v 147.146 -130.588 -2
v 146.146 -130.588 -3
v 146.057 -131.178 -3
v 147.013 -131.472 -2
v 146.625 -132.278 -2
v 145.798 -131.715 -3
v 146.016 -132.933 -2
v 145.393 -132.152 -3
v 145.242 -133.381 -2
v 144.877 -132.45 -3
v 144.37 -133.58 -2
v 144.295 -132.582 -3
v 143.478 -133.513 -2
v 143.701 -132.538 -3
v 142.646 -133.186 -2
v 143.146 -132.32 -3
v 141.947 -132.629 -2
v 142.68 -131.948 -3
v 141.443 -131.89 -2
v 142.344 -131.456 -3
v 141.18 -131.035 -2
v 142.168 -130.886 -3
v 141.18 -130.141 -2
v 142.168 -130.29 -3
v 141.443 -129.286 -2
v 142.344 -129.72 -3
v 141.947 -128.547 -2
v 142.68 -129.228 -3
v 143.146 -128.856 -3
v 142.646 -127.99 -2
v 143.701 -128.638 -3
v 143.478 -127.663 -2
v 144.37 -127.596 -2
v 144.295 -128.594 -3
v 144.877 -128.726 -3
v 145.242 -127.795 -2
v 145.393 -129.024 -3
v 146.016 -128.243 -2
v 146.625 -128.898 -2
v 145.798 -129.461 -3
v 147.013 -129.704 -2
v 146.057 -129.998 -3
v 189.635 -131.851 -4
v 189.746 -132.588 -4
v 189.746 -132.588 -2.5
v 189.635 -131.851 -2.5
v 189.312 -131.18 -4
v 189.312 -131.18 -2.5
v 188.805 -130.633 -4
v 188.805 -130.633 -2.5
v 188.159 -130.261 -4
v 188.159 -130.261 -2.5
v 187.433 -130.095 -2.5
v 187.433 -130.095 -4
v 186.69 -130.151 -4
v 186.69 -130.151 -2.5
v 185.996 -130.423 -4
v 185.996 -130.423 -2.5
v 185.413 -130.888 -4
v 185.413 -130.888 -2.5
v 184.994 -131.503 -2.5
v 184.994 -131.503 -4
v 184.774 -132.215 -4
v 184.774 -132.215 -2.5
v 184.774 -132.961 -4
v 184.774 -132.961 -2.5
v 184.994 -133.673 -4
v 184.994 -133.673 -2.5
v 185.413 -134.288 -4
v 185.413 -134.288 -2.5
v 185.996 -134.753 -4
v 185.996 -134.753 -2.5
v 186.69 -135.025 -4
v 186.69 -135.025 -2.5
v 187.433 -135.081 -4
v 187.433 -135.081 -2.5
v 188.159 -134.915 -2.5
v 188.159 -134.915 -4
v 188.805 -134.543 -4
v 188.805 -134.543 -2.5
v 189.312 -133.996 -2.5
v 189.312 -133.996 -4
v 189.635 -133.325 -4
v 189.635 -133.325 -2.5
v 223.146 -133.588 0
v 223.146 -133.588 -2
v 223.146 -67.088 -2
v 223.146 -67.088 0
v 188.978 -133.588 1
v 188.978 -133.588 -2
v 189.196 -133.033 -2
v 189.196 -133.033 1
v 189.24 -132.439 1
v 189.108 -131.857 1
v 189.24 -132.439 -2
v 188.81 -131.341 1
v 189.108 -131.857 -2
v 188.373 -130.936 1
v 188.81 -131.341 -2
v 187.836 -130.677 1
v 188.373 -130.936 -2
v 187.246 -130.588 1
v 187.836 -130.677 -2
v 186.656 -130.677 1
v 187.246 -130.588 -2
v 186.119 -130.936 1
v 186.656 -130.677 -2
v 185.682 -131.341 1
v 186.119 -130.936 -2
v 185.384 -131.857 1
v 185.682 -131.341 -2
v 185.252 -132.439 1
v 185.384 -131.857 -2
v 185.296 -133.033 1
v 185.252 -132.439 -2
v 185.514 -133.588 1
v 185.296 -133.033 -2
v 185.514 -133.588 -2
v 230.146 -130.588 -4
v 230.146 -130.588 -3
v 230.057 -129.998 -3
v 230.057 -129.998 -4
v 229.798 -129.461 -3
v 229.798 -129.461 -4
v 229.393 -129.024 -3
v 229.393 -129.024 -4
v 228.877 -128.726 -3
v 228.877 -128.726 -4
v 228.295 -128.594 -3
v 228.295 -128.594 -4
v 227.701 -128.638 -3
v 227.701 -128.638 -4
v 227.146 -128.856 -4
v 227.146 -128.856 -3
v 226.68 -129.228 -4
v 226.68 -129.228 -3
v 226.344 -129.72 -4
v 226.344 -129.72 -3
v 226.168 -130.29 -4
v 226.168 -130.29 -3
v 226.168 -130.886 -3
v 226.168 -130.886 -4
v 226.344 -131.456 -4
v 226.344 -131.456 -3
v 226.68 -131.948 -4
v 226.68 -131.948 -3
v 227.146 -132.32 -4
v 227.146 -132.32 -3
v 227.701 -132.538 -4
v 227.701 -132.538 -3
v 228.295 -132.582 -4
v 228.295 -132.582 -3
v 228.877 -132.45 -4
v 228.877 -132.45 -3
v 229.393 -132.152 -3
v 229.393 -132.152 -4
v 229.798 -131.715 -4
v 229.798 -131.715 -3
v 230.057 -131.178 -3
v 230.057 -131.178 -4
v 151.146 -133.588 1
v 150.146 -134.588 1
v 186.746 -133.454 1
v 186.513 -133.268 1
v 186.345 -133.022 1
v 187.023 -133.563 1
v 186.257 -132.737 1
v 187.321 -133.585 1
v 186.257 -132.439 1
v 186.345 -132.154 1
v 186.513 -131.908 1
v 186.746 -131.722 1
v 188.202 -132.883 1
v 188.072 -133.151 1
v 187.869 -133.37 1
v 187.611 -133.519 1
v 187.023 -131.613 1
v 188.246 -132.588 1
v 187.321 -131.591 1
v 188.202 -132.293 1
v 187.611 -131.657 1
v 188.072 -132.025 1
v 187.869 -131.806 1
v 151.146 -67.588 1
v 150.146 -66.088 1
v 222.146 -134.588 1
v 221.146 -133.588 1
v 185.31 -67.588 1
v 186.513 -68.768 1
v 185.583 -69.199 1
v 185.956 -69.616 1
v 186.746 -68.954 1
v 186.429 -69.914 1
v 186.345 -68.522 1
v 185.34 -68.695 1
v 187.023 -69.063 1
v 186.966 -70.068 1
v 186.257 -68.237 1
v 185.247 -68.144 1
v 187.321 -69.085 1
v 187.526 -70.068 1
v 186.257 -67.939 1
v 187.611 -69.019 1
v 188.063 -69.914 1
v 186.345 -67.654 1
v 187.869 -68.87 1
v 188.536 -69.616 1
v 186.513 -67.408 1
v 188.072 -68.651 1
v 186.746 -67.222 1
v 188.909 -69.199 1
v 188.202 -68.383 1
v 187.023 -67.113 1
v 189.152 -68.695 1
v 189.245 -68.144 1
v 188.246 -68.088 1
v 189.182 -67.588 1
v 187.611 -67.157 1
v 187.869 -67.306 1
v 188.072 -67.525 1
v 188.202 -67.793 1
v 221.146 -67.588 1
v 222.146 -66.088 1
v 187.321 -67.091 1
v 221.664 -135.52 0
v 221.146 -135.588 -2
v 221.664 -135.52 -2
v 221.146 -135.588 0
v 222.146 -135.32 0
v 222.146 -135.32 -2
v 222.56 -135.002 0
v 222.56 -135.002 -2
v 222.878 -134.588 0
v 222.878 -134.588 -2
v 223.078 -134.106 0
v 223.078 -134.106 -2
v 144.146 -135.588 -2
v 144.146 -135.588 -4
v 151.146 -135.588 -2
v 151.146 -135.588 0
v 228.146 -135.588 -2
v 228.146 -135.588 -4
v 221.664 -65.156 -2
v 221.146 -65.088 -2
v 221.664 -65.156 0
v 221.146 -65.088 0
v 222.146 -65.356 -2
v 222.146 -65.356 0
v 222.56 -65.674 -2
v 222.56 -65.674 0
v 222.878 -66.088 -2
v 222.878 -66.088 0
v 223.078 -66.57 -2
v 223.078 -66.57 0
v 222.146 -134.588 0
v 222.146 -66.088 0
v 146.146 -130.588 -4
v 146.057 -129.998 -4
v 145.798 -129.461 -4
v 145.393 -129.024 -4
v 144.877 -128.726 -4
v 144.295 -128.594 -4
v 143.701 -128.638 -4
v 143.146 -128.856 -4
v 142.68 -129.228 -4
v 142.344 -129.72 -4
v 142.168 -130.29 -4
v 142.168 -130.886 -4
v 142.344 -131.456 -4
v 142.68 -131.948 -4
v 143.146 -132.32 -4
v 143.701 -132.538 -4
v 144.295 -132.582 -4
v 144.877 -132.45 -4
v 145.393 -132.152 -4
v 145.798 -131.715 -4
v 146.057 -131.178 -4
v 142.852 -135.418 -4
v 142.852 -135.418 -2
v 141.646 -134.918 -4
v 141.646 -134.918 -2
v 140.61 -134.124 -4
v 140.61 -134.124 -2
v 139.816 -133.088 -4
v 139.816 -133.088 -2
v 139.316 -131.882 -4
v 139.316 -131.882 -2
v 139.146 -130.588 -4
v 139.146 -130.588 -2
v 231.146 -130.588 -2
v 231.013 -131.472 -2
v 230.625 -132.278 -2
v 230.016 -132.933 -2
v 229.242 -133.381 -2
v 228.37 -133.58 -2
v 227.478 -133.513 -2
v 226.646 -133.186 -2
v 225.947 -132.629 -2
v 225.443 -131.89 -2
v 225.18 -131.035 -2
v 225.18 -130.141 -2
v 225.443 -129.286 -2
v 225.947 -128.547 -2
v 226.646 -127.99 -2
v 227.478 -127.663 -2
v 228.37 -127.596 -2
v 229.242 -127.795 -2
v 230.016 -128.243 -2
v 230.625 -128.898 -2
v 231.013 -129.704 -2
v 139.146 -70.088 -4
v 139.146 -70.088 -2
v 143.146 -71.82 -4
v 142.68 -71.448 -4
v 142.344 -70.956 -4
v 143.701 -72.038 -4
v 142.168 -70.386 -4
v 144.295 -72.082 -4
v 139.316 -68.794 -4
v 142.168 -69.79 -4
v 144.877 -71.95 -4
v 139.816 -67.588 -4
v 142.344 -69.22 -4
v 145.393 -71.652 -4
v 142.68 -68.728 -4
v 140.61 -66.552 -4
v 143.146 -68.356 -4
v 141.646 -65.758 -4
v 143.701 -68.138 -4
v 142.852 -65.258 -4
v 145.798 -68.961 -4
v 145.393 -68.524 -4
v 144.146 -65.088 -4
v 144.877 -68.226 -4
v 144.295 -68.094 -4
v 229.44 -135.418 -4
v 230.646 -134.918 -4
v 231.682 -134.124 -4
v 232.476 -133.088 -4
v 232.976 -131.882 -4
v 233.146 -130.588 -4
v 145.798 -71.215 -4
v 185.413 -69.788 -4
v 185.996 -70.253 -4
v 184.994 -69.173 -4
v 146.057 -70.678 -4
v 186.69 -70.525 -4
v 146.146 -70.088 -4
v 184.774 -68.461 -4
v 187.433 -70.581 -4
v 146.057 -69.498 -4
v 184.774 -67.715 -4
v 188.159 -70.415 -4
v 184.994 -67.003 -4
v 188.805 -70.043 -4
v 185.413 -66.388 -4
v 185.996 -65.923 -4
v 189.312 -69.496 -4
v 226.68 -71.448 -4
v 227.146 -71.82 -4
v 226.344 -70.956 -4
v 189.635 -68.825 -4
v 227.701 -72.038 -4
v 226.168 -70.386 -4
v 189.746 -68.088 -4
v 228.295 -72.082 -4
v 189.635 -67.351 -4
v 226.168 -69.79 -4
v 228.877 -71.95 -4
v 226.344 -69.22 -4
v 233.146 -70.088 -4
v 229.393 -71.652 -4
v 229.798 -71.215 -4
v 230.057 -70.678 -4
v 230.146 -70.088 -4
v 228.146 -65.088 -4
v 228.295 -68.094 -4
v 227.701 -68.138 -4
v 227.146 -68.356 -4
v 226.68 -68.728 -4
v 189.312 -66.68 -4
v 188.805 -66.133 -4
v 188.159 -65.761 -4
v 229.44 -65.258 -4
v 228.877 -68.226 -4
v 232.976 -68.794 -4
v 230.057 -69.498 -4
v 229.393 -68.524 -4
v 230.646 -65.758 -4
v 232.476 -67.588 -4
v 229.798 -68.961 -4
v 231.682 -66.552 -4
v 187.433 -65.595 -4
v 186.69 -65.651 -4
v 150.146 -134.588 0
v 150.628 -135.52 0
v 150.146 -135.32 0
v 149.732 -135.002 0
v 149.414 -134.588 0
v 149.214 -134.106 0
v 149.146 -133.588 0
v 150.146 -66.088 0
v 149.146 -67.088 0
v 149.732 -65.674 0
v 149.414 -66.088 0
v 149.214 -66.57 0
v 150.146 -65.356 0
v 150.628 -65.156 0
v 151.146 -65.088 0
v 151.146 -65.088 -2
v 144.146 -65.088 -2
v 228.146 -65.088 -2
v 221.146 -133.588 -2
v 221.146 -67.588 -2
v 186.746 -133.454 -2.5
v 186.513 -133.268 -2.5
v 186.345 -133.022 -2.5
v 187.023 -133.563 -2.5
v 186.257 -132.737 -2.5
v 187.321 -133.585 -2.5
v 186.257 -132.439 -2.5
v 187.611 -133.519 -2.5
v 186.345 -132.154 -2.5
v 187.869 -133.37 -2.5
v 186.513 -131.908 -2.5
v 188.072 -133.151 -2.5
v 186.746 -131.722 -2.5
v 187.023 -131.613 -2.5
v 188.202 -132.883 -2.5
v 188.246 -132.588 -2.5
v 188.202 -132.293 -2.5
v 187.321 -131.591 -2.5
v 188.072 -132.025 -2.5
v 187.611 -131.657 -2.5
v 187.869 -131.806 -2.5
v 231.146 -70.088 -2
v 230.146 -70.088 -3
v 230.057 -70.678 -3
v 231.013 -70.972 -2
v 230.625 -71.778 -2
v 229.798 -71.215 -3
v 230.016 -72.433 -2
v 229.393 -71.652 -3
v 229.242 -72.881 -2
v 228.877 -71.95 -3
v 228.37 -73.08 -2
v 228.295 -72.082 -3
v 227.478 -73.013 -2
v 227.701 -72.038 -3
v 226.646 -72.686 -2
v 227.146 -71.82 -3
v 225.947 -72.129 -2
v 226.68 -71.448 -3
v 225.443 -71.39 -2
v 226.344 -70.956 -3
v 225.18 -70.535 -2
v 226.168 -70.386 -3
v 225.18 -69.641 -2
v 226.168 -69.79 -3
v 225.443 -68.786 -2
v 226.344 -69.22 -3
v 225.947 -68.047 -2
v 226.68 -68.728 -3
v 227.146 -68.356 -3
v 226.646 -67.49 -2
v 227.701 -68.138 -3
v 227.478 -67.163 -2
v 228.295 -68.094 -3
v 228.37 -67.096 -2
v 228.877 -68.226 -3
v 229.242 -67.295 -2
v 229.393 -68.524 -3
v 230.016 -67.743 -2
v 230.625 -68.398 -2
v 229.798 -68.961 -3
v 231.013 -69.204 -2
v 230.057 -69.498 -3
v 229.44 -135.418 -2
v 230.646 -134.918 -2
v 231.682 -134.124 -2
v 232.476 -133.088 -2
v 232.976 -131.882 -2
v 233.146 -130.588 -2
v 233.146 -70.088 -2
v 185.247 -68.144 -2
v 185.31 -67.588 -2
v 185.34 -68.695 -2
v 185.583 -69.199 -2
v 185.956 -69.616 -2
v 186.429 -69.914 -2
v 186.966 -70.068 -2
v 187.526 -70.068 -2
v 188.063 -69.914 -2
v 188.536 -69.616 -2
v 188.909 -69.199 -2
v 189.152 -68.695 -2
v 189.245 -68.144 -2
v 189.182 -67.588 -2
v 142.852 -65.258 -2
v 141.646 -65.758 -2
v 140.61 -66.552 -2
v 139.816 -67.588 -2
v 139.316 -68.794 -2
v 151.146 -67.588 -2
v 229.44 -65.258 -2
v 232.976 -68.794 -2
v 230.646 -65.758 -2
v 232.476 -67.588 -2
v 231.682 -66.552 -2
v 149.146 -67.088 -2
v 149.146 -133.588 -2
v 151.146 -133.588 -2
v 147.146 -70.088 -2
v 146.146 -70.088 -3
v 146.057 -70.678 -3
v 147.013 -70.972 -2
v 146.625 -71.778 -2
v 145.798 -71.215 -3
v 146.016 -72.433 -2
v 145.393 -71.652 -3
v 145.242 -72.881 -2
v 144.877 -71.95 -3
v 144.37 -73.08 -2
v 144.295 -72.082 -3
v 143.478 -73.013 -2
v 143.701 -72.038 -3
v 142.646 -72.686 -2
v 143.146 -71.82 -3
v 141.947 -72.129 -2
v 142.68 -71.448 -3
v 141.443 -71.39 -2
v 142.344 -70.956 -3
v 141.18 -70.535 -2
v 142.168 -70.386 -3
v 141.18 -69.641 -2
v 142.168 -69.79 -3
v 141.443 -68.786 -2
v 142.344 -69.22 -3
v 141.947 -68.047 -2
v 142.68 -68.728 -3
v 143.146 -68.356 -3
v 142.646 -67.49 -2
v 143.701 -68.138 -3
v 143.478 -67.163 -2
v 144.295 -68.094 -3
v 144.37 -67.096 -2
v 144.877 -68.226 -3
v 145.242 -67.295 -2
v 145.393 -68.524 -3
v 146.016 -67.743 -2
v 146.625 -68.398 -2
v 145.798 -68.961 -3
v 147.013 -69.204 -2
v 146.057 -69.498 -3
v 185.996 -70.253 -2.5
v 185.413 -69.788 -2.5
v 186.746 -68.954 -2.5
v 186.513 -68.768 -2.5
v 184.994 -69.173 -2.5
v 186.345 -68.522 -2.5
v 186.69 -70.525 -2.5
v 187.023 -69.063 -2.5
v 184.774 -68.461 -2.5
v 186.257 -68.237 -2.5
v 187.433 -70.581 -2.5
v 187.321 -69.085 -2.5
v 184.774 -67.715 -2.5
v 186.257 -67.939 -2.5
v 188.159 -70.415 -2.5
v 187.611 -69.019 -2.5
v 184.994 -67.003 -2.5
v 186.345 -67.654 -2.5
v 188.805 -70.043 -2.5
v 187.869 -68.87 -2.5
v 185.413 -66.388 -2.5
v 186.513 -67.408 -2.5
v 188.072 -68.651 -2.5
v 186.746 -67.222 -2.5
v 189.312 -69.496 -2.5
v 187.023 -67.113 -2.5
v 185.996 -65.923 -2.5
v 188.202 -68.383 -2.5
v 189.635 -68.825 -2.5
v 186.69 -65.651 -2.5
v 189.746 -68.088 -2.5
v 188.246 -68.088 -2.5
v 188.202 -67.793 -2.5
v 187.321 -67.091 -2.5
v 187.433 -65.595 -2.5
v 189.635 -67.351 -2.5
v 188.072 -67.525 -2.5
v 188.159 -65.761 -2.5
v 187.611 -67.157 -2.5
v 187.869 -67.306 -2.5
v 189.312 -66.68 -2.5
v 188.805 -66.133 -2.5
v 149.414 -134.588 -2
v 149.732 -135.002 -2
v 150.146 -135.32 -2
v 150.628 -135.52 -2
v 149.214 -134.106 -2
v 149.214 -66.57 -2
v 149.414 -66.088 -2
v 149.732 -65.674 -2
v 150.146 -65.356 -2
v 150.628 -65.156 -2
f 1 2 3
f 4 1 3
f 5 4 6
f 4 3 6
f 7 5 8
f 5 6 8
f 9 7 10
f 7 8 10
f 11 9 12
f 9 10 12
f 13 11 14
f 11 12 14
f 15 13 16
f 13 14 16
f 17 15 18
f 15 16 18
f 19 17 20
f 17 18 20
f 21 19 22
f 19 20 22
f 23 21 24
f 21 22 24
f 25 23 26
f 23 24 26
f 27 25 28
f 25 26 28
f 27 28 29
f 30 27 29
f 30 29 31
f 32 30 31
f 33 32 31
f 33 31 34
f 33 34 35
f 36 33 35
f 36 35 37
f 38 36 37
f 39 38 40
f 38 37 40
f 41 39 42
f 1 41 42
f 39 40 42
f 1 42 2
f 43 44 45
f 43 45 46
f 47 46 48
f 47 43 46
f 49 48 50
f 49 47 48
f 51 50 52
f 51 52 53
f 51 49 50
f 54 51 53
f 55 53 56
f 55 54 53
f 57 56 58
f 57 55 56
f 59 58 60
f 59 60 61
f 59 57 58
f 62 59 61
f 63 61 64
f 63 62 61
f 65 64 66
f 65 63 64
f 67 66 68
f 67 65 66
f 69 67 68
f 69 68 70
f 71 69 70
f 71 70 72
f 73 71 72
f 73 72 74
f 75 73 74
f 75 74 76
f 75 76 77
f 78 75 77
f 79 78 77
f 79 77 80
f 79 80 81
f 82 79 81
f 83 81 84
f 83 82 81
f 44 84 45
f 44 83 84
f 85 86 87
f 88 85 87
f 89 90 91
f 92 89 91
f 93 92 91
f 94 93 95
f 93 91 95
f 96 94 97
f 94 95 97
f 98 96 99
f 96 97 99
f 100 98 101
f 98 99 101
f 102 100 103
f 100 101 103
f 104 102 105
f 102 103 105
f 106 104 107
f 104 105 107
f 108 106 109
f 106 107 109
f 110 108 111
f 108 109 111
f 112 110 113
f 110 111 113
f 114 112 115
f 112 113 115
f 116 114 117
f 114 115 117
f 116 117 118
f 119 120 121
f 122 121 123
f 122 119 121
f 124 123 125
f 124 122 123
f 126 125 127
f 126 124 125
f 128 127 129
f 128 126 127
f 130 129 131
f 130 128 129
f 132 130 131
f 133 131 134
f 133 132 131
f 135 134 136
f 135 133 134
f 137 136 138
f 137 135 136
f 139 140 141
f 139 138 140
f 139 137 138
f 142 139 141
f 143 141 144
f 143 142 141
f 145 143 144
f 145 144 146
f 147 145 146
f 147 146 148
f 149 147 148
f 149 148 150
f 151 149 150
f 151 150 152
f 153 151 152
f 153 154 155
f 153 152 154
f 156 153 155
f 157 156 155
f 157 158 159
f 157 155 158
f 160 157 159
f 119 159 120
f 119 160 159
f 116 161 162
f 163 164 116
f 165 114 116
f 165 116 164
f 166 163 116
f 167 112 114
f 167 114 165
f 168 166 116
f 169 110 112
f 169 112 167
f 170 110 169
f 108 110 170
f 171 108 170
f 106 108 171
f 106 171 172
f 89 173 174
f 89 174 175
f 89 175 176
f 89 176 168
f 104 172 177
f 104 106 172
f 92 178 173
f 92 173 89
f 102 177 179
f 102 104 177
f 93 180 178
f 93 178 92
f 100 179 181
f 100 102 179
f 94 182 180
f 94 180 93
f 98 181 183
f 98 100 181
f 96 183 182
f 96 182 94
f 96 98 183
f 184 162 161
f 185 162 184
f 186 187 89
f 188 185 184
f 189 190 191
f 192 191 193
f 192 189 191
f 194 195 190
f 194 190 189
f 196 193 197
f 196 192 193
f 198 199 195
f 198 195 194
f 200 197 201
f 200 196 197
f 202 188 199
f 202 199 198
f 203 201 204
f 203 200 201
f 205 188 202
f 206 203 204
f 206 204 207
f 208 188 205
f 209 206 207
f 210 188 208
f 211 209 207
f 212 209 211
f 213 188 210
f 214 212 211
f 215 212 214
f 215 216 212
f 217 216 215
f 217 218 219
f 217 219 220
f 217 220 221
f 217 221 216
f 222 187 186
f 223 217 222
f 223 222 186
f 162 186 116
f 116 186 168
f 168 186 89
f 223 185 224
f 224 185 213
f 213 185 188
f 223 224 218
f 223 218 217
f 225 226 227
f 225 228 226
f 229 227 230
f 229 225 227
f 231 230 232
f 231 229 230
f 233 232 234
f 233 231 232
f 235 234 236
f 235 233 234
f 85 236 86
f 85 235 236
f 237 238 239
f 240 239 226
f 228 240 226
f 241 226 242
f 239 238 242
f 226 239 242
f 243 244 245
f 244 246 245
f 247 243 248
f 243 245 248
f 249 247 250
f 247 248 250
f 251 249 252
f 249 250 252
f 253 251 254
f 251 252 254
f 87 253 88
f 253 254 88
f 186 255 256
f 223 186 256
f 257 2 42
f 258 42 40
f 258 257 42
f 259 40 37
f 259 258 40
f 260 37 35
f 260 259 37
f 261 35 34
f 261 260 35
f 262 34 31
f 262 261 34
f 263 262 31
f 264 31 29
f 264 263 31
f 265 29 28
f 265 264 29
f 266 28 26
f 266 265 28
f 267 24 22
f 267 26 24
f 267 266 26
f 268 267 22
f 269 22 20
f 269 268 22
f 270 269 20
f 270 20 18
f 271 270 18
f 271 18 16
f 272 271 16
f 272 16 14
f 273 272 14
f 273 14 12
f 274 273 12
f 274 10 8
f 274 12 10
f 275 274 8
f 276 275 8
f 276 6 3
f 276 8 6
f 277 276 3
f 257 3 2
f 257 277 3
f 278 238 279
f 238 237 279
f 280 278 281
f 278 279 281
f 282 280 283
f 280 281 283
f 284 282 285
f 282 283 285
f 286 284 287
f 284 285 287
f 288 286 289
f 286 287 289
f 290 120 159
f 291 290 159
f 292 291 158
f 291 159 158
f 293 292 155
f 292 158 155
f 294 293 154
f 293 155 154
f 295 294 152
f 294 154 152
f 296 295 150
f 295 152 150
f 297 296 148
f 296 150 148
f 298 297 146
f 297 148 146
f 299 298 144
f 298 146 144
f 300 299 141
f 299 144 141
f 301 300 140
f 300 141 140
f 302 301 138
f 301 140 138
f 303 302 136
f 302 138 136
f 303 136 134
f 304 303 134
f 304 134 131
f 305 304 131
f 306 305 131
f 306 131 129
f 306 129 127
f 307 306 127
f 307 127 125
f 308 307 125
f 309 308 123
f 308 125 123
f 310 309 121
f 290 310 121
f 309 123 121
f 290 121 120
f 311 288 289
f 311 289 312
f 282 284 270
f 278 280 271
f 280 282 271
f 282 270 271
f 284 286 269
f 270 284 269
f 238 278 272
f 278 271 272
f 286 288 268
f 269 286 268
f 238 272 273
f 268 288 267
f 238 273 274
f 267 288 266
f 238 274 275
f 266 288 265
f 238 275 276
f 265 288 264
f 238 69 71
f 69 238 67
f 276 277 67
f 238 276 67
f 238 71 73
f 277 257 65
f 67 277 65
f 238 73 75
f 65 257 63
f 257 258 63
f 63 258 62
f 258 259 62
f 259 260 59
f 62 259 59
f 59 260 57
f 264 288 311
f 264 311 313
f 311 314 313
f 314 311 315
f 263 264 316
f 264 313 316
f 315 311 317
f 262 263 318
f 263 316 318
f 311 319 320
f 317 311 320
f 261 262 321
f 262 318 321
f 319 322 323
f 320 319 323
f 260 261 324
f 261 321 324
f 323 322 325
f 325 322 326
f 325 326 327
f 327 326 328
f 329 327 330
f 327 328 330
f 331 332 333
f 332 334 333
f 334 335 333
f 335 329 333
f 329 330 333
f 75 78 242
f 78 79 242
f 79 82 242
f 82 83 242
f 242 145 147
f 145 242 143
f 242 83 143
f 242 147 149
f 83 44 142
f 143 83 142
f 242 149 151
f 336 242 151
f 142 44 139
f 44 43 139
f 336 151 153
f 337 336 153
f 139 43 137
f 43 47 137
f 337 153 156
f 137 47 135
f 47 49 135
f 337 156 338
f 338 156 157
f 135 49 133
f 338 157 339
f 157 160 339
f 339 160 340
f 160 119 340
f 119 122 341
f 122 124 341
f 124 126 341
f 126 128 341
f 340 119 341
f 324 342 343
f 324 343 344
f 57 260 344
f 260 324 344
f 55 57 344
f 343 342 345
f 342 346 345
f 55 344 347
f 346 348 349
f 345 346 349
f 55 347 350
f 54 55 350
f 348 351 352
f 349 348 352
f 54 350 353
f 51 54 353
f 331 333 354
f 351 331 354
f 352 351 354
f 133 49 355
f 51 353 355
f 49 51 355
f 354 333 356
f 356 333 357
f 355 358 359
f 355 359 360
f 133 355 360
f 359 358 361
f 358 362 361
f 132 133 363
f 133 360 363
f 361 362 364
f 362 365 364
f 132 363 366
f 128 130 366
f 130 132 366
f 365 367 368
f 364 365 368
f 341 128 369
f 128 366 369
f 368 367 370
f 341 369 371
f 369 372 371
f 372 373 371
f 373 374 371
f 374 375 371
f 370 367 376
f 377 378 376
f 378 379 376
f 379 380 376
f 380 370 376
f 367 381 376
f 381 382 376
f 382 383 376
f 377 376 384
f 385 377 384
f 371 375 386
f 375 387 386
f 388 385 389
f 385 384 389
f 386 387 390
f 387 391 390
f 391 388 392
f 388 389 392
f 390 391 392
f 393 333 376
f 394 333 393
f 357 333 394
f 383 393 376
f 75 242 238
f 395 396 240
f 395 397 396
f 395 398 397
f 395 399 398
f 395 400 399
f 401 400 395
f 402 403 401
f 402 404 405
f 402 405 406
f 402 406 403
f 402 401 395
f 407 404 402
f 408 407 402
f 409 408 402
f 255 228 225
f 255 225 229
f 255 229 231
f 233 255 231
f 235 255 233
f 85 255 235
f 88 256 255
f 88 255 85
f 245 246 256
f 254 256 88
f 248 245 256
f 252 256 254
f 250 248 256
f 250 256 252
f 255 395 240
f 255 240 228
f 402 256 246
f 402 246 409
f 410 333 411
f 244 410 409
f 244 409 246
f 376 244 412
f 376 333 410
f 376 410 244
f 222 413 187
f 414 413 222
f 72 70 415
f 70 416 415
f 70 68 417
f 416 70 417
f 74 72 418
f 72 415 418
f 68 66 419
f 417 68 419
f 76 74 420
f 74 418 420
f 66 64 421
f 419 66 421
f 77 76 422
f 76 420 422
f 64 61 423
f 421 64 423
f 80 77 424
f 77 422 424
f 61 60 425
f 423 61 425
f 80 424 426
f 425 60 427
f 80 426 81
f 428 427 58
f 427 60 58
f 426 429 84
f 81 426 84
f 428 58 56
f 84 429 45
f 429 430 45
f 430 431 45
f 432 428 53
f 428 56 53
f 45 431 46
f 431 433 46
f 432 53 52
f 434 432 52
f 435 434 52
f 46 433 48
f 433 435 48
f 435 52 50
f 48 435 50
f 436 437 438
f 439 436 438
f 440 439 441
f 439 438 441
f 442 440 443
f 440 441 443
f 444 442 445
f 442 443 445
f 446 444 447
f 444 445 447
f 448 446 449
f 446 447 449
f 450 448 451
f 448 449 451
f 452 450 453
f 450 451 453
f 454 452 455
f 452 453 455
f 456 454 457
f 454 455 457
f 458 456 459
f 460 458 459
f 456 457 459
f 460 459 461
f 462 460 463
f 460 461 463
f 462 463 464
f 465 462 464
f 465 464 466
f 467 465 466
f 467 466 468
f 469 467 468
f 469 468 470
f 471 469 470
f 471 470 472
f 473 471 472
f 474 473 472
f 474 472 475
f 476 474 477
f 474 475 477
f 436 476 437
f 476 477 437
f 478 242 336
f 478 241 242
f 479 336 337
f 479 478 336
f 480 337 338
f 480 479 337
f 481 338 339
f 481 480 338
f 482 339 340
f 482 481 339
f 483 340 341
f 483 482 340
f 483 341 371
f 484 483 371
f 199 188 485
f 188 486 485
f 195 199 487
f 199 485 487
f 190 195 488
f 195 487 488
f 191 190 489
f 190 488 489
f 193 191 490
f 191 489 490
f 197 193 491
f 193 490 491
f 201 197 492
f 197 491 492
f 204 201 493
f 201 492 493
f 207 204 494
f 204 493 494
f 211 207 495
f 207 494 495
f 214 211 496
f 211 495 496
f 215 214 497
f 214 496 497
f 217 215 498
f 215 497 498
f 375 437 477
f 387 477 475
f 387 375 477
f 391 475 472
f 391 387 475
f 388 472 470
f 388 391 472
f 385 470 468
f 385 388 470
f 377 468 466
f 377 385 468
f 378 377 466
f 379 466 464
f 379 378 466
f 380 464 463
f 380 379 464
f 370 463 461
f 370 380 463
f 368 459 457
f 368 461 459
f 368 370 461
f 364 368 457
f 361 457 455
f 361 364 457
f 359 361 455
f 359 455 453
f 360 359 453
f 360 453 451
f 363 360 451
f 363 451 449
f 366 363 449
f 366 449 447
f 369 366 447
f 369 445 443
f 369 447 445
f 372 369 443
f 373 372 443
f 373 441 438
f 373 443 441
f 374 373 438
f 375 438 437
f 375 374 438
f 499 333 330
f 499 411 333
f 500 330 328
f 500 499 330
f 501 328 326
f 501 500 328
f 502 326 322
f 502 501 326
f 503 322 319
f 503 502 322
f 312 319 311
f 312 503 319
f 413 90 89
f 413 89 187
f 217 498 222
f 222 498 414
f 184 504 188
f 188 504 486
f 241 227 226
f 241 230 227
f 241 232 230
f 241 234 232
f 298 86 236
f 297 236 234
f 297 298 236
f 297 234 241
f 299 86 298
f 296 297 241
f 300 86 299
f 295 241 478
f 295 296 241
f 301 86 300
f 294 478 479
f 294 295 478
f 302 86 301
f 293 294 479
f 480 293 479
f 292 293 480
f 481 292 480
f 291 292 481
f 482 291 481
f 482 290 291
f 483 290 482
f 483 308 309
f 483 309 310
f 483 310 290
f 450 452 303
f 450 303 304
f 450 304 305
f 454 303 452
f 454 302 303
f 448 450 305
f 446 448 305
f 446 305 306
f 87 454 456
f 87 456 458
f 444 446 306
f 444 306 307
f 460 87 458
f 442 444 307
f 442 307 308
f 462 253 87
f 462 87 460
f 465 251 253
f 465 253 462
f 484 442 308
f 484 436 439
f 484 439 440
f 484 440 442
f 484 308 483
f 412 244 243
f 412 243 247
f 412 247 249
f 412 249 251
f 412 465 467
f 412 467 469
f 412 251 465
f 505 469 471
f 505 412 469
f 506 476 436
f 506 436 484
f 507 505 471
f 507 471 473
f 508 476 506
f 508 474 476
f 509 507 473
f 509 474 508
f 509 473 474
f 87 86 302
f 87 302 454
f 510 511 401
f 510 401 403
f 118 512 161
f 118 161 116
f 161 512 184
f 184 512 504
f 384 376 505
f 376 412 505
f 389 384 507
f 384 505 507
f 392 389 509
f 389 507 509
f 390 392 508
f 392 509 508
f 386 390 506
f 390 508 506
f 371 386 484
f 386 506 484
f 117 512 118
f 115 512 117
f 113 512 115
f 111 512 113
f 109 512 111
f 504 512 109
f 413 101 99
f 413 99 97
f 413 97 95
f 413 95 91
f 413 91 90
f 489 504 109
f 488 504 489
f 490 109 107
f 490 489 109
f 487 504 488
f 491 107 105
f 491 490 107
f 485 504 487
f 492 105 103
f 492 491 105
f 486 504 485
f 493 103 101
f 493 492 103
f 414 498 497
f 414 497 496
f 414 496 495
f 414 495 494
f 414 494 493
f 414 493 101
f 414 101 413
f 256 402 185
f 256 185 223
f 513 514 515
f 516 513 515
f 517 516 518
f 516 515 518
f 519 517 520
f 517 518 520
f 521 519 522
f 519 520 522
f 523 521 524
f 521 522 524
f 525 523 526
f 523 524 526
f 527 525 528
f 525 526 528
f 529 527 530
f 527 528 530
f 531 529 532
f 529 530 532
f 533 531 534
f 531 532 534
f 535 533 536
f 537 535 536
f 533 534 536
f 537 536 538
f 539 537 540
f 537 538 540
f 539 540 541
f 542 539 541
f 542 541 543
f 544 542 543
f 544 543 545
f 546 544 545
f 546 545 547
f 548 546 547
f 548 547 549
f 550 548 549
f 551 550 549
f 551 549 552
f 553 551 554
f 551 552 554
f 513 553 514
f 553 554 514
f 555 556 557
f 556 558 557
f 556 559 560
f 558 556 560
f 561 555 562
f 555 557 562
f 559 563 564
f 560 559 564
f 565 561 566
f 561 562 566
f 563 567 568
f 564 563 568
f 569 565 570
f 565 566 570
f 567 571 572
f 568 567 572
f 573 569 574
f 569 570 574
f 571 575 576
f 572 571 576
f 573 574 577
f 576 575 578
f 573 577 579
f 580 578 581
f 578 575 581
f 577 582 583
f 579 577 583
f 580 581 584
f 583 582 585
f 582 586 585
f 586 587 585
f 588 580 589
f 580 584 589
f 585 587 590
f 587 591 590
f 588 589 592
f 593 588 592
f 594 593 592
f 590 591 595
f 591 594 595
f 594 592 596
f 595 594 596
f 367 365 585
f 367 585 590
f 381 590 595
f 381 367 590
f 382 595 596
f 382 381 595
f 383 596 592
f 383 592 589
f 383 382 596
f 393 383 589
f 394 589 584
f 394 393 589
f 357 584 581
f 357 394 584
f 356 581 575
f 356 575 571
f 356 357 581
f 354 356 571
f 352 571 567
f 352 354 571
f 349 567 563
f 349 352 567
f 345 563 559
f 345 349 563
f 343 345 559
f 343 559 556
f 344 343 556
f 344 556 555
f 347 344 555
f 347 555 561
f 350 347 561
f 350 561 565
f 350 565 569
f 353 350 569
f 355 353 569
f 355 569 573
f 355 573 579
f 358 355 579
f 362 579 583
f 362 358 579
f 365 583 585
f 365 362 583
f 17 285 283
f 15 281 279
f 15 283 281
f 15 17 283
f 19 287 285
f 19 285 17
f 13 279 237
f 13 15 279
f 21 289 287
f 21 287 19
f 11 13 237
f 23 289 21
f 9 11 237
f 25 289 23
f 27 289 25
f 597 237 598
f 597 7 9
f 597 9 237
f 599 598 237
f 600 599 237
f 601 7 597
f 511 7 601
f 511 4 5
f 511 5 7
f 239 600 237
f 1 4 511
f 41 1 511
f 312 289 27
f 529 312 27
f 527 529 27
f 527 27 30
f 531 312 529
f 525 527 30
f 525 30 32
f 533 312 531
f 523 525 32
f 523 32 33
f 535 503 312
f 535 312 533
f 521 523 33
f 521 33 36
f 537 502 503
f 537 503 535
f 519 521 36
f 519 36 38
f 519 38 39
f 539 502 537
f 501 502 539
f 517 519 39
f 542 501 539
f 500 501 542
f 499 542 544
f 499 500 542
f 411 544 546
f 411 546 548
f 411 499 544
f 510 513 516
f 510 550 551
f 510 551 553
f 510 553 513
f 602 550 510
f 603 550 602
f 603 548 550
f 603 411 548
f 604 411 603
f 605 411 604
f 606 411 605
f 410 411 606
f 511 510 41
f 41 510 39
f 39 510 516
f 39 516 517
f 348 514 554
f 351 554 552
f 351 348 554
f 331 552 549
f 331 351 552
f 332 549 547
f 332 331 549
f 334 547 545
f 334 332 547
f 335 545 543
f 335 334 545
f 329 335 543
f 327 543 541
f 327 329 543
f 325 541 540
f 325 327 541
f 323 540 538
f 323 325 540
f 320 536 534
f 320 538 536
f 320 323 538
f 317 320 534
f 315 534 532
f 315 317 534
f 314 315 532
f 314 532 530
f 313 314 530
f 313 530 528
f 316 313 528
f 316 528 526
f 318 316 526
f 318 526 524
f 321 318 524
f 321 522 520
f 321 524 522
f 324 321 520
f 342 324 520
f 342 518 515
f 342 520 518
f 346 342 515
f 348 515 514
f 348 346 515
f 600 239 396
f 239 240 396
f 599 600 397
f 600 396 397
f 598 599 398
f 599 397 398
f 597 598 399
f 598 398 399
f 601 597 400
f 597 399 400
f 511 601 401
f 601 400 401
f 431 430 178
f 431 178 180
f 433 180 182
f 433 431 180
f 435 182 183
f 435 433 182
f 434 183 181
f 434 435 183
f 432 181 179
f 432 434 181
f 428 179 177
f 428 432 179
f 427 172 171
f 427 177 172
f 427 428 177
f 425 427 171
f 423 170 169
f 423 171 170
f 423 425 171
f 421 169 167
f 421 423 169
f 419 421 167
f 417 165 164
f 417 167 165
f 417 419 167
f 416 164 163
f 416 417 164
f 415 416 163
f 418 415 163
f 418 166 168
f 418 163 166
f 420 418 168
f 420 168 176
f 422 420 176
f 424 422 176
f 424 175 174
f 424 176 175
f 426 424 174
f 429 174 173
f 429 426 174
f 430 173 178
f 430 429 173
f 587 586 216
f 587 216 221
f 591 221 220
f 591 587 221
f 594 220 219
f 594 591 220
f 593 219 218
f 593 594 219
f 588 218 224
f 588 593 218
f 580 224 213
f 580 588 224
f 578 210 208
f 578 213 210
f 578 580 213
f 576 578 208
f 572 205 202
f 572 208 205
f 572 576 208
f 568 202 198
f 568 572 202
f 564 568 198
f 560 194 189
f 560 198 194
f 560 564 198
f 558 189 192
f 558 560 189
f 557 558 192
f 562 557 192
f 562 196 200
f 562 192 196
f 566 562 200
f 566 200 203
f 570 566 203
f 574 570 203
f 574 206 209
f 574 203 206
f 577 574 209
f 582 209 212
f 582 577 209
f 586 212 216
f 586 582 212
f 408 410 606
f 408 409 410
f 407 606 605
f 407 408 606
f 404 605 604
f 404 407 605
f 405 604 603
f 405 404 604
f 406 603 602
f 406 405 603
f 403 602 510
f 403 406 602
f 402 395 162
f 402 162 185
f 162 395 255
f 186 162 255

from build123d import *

# Parameters (mm, degrees)
CYLINDER004_R            = 2
CYLINDER004_DEPTH        = 10
ARRAY005_Y_COUNT         = 2
ARRAY005_Y_PITCH         = 60.5
BOX007_W                 = 10
BOX007_H                 = 70.5
BOX007_DEPTH             = 2
ARRAY006_X_COUNT         = 2
ARRAY006_X_PITCH         = 84
CYLINDER003_R            = 2.5
CYLINDER003_DEPTH        = 1.5
ARRAY004_Y_COUNT         = 2
ARRAY004_Y_PITCH         = 64.5
CYLINDER002_R            = 1
CYLINDER002_DEPTH        = 20
ARRAY003_Y_COUNT         = 2
ARRAY003_Y_PITCH         = 64.5
PCB_BOUNDING_BOX_1_W     = 70
PCB_BOUNDING_BOX_1_H     = 66
PCB_BOUNDING_BOX_1_DEPTH = 20
BOX001_W                 = 72
BOX001_H                 = 68.5
BOX001_DEPTH             = 1
BOX_W                    = 74
BOX_H                    = 70.5
BOX_DEPTH                = 4
CYLINDER_R               = 2
CYLINDER_DEPTH           = 3
ARRAY_Y_COUNT            = 2
ARRAY_Y_PITCH            = 64.5
FILLET001_R              = 2
FILLET002_R              = 5
CHAMFER_SIZE             = 1


with BuildPart() as array005:
    # Cylinder004 → Cylinder004 (new body)
    with BuildSketch(Plane(origin=(144.146, -130.588, -4), x_dir=(1, 0, 0), z_dir=(0, 0, 1))):
        Circle(CYLINDER004_R)
    extrude(amount=CYLINDER004_DEPTH)

    # Array005 Y: Array005 ×2


with BuildPart() as array005_1:
    add(array005.part)
    with Locations(*[(0, i * ARRAY005_Y_PITCH, 0) for i in range(1, ARRAY005_Y_COUNT)]):
        add(array005.part)


with BuildPart() as array006:
    # Box007 → Box007 (new body)
    with BuildSketch(Plane(origin=(139.146, -135.588, -4), x_dir=(1, 0, 0), z_dir=(0, 0, 1))):
        with Locations((5, 35.25)):
            Rectangle(BOX007_W, BOX007_H)
    extrude(amount=BOX007_DEPTH)

    # Cut009: cut Array005
    add(array005_1.part, mode=Mode.SUBTRACT)

    # Array006 X: Array006 ×2


with BuildPart() as array006_1:
    add(array006.part)
    with Locations(*[(i * ARRAY006_X_PITCH, 0, 0) for i in range(1, ARRAY006_X_COUNT)]):
        add(array006.part)


with BuildPart() as array004:
    # Cylinder003 → Cylinder003 (new body)
    with BuildSketch(Plane(origin=(187.246, -132.588, -4), x_dir=(1, 0, 0), z_dir=(0, 0, 1))):
        Circle(CYLINDER003_R)
    extrude(amount=CYLINDER003_DEPTH)

    # Array004 Y: Array004 ×2


with BuildPart() as array004_1:
    add(array004.part)
    with Locations(*[(0, i * ARRAY004_Y_PITCH, 0) for i in range(1, ARRAY004_Y_COUNT)]):
        add(array004.part)


with BuildPart() as lochboden:
    # Cylinder002 → Cylinder002 (new body)
    with BuildSketch(Plane(origin=(187.246, -132.588, -4), x_dir=(1, 0, 0), z_dir=(0, 0, 1))):
        Circle(CYLINDER002_R)
    extrude(amount=CYLINDER002_DEPTH)

    # Array003 Y: LochBoden ×2


with BuildPart() as lochboden_1:
    add(lochboden.part)
    with Locations(*[(0, i * ARRAY003_Y_PITCH, 0) for i in range(1, ARRAY003_Y_COUNT)]):
        add(lochboden.part)


with BuildPart() as bbox_cutboden:
    # PCB_Bounding_Box_1 → PCB_Bounding_Box_1 (new body)
    with BuildSketch(Plane(origin=(151.146, -133.588, -2), x_dir=(1, 0, 0), z_dir=(0, 0, 1))):
        with Locations((35, 33)):
            Rectangle(PCB_BOUNDING_BOX_1_W, PCB_BOUNDING_BOX_1_H)
    extrude(amount=PCB_BOUNDING_BOX_1_DEPTH)


with BuildPart() as bodenrand:
    # Box001 → Box001 (new body)
    with BuildSketch(Plane(origin=(150.146, -134.588, 0), x_dir=(1, 0, 0), z_dir=(0, 0, 1))):
        with Locations((36, 34.25)):
            Rectangle(BOX001_W, BOX001_H)
    extrude(amount=BOX001_DEPTH)


with BuildPart() as cut:
    # Box → Box (new body)
    with BuildSketch(Plane(origin=(149.146, -135.588, -4), x_dir=(1, 0, 0), z_dir=(0, 0, 1))):
        with Locations((37, 35.25)):
            Rectangle(BOX_W, BOX_H)
    extrude(amount=BOX_DEPTH)

    # Fusion: union BodenRand
    add(bodenrand.part)

    # Cut: cut BBox - CutBoden
    add(bbox_cutboden.part, mode=Mode.SUBTRACT)


with BuildPart() as chamfer_body:
    # Cylinder → Cylinder (new body)
    with BuildSketch(Plane(origin=(187.246, -132.588, -2), x_dir=(1, 0, 0), z_dir=(0, 0, 1))):
        Circle(CYLINDER_R)
    extrude(amount=CYLINDER_DEPTH)

    # Array Y: Chamfer body ×2


with BuildPart() as chamfer_body_1:
    add(chamfer_body.part)
    with Locations(*[(0, i * ARRAY_Y_PITCH, 0) for i in range(1, ARRAY_Y_COUNT)]):
        add(chamfer_body.part)

    # Fusion003: union Cut
    add(cut.part)

    # Cut006: cut LochBoden
    add(lochboden_1.part, mode=Mode.SUBTRACT)

    # Cut008: cut Array004
    add(array004_1.part, mode=Mode.SUBTRACT)

    # Fusion005: union Array006
    add(array006_1.part)

    # Fillet001
    fillet001_edges = [chamfer_body_1.edges().sort_by_distance(p)[0] for p in [
        (149.146, -135.588, -1),
        (149.146, -65.088, -1),
        (223.146, -65.088, -1),
        (223.146, -135.588, -1),
    ]]
    fillet(fillet001_edges, radius=FILLET001_R)

    # Fillet002
    fillet002_edges = [chamfer_body_1.edges().sort_by_distance(p)[0] for p in [
        (139.146, -135.588, -3),
        (233.146, -135.588, -3),
        (139.146, -65.088, -3),
        (233.146, -65.088, -3),
    ]]
    fillet(fillet002_edges, radius=FILLET002_R)

    # Chamfer
    chamfer_edges = [chamfer_body_1.edges().sort_by_distance(p)[0] for p in [
        (142.146, -70.088, -2),
        (142.146, -130.588, -2),
        (226.146, -70.088, -2),
        (226.146, -130.588, -2),
    ]]
    chamfer(chamfer_edges, length=CHAMFER_SIZE)


solid = chamfer_body_1.part
